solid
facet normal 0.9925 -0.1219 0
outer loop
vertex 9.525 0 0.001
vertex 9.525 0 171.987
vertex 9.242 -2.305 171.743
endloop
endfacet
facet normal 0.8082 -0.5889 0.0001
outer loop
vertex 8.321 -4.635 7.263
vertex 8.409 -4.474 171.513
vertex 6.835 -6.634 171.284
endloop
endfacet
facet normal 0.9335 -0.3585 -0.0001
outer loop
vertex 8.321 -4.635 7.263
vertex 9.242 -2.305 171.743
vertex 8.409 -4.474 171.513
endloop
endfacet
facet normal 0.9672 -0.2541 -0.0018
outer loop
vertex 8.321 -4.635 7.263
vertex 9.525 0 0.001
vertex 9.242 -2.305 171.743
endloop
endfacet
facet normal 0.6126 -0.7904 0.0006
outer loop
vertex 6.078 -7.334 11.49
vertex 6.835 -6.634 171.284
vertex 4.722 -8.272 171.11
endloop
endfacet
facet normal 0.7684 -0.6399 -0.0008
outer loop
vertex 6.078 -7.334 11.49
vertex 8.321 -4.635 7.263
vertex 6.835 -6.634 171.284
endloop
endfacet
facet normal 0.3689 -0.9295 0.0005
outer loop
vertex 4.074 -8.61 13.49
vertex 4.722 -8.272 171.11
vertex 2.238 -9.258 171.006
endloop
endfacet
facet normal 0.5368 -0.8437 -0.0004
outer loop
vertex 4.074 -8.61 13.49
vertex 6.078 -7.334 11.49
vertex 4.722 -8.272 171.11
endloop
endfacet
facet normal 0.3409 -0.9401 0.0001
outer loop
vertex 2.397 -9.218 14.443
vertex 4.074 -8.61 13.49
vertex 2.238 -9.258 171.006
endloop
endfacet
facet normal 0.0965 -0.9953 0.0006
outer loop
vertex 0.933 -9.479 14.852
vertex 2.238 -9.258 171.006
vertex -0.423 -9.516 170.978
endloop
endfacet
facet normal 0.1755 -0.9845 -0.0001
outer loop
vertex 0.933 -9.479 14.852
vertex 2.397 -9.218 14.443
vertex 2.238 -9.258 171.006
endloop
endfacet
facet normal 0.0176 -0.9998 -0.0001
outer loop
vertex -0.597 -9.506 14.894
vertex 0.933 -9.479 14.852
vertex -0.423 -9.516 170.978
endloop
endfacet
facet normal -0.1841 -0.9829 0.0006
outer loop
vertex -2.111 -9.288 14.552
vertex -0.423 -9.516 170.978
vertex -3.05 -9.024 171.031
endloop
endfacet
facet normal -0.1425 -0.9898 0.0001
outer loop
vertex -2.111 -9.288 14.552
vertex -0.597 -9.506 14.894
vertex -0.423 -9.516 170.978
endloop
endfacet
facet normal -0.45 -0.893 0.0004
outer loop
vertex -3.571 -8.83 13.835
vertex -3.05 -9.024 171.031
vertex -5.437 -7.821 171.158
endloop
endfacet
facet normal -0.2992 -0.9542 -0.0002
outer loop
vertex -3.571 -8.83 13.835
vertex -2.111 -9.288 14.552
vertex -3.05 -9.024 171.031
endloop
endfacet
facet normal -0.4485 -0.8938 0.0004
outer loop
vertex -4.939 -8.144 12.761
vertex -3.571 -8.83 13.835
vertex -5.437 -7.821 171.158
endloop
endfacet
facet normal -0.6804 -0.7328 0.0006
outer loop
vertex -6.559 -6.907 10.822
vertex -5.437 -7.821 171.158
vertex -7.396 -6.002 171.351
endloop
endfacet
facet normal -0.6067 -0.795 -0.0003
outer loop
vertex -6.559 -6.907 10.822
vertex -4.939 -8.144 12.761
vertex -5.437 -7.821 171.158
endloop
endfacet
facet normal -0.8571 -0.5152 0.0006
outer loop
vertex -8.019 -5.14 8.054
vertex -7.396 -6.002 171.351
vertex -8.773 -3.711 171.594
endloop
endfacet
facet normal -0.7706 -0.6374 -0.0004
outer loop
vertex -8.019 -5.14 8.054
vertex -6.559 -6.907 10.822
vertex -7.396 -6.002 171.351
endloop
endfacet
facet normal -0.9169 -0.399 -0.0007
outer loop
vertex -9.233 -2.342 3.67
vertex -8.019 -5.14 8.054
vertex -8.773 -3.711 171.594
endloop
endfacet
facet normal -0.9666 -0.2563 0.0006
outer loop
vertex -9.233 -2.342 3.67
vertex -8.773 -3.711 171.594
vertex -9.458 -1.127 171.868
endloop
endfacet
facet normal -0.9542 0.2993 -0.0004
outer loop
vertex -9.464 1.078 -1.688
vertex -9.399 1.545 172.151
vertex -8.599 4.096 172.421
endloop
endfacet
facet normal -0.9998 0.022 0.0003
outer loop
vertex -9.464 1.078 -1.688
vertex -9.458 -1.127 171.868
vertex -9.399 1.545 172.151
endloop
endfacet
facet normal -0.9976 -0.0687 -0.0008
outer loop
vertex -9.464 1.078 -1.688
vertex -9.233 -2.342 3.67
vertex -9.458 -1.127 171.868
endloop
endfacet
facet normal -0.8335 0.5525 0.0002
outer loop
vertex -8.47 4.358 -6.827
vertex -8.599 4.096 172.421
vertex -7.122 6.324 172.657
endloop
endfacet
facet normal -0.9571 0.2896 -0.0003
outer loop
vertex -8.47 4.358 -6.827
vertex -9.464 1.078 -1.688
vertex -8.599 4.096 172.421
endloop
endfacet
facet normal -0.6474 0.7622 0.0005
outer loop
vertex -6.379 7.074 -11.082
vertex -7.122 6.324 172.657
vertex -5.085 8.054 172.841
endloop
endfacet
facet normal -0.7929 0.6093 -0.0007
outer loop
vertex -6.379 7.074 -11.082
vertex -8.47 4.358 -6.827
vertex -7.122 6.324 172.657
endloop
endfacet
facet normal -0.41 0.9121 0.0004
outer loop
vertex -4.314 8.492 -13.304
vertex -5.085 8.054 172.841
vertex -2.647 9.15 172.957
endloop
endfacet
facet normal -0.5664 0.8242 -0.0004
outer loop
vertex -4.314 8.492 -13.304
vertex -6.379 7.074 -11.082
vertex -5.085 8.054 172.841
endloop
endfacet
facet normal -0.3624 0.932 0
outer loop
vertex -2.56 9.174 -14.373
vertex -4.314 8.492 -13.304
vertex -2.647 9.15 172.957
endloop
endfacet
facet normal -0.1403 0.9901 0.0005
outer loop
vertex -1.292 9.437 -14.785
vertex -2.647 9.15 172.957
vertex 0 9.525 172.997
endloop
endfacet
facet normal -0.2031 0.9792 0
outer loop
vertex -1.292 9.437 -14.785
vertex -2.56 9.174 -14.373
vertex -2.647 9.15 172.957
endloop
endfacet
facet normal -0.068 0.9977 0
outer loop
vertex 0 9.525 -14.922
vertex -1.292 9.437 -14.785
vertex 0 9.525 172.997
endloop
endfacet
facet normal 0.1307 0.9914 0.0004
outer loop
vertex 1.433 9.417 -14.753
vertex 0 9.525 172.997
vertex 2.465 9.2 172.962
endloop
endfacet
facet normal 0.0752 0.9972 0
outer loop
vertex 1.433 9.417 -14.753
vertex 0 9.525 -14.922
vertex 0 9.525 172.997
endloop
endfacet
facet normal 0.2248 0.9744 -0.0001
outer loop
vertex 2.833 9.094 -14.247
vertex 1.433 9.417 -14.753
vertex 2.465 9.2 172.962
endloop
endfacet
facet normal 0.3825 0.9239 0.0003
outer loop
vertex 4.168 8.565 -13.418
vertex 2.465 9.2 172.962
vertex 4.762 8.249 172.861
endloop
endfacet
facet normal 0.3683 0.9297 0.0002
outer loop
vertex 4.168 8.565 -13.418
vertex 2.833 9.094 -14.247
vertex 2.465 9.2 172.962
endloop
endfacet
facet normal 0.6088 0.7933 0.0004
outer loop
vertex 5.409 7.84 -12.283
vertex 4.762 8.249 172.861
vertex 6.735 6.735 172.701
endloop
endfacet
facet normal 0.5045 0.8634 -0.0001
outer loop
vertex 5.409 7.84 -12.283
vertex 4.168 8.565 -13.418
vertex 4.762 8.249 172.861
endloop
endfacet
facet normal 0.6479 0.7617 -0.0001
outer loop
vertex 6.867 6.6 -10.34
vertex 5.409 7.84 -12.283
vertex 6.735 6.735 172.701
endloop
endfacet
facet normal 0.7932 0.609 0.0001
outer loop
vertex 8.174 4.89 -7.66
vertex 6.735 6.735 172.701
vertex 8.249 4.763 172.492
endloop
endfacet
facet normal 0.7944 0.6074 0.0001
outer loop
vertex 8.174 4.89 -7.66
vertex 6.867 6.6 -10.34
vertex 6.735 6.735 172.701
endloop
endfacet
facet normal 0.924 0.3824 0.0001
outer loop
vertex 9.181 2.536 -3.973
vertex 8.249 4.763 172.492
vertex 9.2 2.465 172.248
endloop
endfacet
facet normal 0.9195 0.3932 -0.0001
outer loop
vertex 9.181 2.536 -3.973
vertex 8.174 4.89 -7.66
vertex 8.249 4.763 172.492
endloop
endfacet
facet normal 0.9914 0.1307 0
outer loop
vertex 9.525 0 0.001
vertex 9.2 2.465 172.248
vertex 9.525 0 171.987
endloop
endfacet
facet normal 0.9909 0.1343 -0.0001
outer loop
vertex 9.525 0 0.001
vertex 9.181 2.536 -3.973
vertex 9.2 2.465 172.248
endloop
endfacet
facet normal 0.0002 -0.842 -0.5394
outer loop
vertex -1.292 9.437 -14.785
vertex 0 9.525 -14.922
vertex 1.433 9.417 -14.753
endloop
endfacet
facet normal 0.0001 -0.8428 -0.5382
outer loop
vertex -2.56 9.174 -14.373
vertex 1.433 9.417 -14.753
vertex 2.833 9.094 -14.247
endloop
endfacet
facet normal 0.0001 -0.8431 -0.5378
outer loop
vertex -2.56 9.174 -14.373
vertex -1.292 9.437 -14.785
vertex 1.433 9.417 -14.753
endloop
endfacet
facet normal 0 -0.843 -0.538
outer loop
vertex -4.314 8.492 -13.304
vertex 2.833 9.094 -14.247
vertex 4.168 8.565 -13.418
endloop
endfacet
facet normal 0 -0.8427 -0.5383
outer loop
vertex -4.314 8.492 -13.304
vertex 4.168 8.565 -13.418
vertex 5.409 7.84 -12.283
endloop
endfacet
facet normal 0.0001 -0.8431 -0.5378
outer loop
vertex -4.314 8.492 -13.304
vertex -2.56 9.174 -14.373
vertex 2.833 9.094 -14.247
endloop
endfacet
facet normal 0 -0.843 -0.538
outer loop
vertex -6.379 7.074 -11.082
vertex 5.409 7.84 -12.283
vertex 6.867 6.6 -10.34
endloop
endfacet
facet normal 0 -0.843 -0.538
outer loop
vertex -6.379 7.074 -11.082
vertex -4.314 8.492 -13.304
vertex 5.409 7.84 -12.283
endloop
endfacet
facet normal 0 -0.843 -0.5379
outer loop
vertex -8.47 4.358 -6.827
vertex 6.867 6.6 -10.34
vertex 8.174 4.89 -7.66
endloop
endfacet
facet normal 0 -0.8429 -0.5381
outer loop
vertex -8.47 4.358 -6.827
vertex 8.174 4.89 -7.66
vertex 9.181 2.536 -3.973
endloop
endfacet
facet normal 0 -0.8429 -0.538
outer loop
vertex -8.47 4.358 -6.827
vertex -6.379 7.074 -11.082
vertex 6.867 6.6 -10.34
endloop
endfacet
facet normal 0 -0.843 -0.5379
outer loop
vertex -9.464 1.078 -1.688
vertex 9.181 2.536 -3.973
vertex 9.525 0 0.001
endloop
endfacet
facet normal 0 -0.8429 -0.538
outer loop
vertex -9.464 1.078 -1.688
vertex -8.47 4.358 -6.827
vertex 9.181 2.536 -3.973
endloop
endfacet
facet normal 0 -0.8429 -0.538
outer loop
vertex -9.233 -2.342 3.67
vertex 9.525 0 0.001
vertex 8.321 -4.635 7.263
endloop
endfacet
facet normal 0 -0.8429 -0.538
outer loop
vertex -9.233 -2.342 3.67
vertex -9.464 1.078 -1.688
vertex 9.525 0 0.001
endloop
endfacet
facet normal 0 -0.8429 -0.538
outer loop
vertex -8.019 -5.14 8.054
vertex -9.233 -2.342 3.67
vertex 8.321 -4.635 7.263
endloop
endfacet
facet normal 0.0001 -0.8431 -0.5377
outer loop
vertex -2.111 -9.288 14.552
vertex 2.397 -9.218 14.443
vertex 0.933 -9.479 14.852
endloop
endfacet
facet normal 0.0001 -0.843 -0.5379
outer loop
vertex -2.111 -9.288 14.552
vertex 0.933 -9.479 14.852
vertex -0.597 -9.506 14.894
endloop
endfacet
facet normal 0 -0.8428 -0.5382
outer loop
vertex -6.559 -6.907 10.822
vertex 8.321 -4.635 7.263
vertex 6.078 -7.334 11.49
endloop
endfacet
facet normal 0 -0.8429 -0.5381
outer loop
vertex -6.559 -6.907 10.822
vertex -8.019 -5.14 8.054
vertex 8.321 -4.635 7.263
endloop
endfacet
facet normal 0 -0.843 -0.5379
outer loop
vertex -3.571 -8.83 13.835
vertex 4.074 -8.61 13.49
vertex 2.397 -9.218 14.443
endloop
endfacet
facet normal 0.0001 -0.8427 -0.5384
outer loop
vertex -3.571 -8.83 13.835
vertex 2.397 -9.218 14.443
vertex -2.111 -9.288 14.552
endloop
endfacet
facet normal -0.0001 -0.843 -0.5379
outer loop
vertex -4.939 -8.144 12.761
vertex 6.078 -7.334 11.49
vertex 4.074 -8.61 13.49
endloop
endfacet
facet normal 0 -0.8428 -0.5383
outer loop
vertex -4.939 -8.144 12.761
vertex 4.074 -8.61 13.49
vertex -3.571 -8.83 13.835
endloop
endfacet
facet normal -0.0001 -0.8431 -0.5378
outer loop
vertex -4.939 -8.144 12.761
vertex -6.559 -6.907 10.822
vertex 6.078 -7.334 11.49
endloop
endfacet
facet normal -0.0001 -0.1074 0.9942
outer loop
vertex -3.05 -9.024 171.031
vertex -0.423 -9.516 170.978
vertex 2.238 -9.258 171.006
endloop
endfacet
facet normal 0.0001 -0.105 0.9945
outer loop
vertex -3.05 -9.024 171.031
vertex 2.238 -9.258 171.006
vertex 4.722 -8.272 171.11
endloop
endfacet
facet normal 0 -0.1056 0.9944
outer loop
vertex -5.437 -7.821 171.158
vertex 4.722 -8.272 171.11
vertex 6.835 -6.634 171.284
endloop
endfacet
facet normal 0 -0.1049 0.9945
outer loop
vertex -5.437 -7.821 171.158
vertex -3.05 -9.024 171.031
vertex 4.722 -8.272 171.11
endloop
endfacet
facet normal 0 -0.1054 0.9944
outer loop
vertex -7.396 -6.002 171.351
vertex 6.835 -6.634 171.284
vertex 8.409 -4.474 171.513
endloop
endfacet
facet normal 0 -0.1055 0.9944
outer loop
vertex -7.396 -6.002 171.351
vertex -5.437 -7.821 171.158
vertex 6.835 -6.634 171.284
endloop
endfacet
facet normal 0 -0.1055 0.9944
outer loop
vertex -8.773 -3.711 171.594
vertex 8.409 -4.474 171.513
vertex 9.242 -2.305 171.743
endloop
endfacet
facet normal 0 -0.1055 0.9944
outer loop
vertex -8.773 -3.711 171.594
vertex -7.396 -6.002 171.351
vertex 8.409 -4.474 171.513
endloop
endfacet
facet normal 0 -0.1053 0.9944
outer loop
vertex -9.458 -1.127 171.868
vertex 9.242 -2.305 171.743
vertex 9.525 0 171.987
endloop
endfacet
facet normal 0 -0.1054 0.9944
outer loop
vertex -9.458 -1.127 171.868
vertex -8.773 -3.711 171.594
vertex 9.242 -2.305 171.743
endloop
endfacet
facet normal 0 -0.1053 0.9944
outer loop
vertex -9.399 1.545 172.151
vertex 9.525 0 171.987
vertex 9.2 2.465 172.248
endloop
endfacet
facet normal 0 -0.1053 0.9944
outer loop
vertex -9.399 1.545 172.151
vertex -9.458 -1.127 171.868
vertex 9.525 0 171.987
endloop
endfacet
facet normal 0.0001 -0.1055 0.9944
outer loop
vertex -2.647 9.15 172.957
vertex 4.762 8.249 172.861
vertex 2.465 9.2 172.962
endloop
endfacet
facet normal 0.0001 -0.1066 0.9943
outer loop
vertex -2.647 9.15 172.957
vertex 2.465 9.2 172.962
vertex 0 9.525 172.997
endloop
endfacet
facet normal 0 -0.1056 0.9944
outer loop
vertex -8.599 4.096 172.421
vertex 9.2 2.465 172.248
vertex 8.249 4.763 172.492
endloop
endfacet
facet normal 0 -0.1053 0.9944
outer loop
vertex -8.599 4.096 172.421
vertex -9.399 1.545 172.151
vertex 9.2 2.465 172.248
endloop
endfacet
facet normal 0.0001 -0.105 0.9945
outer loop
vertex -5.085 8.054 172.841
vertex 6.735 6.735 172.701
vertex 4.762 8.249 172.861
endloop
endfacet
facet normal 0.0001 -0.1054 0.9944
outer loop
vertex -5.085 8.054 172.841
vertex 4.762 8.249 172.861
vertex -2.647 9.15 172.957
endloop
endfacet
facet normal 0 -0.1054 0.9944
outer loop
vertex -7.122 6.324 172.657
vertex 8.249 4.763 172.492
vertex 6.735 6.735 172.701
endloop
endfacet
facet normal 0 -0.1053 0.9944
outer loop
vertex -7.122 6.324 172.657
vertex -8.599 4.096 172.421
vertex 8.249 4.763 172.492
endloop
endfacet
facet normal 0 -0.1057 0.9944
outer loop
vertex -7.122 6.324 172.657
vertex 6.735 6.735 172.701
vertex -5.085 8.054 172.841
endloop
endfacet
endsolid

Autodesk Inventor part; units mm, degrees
ref_plane "Start Plane" through (0, 0, -14.9225) normal (0, 0, 1) x (1, 0, 0)
ref_plane "End Plane" through (0, 0, 172.9966) normal (0, 0, 1) x (1, 0, 0)
sketch "Sketch" plane through (0, 0, 0) normal (0, 0, 1) x (1, 0, 0)
  circle A0 centre (0, 0) radius 9.525
  dimension "d0" = 19.05
extrude "Body" add sketch "Sketch" along normal up to surface (187.9191 mm away) from surface at -14.9225
sketch "Sketch2" plane through (0, 0, 0) normal (0, 0, 1) x (1, 0, 0)
  line L0 (0, 0) -> (10, 0)
ref_plane "Work Plane3" through (0, 0, 0) normal (0, -1, 0) x (1, 0, 0)
ref_plane "Work Plane4" through (0, 9.525, 172.9966) normal (0, -0.1054, 0.9944) x (1, 0, 0)
split "Split1" plane through (0, 9.525, 172.9966) removes the side toward (0, -0.1054, 0.9944)
ref_plane "Work Plane5" through (0, 9.525, -14.9225) normal (0, -0.8429, -0.538) x (1, 0, 0)
split "Split2" plane through (0, 9.525, -14.9225) removes the side toward (0, -0.8429, -0.538)
sketch "Sketch3" plane through (0, 0, 0) normal (0, -1, 0) x (1, 0, 0)
  line L0 (-2, -14.9225) -> (12, -14.9225) projected
  line L1 (-2, 172.9966) -> (12, 172.9966) projected
  dimension "d7" = 187.9191
equation "\"d0\" = Diam"
equation "\"d1\" = G_L"
equation "\"Diam\" = 19.05"
equation "\"G_L\" = d7"
equation "\"G_OFFSET_START\" = 14.92247"
equation "\"G_OFFSET_END\" = 1.00953"
equation "\"d4\" = -G_OFFSET_START"
equation "\"d5\" = G_OFFSET_END + B_L"
equation "\"B_L\" = 171.98707"
properties part number "ANSI/AISC Rolled Steel - 3/4-7.398, RB" material "Steel, Mild"
